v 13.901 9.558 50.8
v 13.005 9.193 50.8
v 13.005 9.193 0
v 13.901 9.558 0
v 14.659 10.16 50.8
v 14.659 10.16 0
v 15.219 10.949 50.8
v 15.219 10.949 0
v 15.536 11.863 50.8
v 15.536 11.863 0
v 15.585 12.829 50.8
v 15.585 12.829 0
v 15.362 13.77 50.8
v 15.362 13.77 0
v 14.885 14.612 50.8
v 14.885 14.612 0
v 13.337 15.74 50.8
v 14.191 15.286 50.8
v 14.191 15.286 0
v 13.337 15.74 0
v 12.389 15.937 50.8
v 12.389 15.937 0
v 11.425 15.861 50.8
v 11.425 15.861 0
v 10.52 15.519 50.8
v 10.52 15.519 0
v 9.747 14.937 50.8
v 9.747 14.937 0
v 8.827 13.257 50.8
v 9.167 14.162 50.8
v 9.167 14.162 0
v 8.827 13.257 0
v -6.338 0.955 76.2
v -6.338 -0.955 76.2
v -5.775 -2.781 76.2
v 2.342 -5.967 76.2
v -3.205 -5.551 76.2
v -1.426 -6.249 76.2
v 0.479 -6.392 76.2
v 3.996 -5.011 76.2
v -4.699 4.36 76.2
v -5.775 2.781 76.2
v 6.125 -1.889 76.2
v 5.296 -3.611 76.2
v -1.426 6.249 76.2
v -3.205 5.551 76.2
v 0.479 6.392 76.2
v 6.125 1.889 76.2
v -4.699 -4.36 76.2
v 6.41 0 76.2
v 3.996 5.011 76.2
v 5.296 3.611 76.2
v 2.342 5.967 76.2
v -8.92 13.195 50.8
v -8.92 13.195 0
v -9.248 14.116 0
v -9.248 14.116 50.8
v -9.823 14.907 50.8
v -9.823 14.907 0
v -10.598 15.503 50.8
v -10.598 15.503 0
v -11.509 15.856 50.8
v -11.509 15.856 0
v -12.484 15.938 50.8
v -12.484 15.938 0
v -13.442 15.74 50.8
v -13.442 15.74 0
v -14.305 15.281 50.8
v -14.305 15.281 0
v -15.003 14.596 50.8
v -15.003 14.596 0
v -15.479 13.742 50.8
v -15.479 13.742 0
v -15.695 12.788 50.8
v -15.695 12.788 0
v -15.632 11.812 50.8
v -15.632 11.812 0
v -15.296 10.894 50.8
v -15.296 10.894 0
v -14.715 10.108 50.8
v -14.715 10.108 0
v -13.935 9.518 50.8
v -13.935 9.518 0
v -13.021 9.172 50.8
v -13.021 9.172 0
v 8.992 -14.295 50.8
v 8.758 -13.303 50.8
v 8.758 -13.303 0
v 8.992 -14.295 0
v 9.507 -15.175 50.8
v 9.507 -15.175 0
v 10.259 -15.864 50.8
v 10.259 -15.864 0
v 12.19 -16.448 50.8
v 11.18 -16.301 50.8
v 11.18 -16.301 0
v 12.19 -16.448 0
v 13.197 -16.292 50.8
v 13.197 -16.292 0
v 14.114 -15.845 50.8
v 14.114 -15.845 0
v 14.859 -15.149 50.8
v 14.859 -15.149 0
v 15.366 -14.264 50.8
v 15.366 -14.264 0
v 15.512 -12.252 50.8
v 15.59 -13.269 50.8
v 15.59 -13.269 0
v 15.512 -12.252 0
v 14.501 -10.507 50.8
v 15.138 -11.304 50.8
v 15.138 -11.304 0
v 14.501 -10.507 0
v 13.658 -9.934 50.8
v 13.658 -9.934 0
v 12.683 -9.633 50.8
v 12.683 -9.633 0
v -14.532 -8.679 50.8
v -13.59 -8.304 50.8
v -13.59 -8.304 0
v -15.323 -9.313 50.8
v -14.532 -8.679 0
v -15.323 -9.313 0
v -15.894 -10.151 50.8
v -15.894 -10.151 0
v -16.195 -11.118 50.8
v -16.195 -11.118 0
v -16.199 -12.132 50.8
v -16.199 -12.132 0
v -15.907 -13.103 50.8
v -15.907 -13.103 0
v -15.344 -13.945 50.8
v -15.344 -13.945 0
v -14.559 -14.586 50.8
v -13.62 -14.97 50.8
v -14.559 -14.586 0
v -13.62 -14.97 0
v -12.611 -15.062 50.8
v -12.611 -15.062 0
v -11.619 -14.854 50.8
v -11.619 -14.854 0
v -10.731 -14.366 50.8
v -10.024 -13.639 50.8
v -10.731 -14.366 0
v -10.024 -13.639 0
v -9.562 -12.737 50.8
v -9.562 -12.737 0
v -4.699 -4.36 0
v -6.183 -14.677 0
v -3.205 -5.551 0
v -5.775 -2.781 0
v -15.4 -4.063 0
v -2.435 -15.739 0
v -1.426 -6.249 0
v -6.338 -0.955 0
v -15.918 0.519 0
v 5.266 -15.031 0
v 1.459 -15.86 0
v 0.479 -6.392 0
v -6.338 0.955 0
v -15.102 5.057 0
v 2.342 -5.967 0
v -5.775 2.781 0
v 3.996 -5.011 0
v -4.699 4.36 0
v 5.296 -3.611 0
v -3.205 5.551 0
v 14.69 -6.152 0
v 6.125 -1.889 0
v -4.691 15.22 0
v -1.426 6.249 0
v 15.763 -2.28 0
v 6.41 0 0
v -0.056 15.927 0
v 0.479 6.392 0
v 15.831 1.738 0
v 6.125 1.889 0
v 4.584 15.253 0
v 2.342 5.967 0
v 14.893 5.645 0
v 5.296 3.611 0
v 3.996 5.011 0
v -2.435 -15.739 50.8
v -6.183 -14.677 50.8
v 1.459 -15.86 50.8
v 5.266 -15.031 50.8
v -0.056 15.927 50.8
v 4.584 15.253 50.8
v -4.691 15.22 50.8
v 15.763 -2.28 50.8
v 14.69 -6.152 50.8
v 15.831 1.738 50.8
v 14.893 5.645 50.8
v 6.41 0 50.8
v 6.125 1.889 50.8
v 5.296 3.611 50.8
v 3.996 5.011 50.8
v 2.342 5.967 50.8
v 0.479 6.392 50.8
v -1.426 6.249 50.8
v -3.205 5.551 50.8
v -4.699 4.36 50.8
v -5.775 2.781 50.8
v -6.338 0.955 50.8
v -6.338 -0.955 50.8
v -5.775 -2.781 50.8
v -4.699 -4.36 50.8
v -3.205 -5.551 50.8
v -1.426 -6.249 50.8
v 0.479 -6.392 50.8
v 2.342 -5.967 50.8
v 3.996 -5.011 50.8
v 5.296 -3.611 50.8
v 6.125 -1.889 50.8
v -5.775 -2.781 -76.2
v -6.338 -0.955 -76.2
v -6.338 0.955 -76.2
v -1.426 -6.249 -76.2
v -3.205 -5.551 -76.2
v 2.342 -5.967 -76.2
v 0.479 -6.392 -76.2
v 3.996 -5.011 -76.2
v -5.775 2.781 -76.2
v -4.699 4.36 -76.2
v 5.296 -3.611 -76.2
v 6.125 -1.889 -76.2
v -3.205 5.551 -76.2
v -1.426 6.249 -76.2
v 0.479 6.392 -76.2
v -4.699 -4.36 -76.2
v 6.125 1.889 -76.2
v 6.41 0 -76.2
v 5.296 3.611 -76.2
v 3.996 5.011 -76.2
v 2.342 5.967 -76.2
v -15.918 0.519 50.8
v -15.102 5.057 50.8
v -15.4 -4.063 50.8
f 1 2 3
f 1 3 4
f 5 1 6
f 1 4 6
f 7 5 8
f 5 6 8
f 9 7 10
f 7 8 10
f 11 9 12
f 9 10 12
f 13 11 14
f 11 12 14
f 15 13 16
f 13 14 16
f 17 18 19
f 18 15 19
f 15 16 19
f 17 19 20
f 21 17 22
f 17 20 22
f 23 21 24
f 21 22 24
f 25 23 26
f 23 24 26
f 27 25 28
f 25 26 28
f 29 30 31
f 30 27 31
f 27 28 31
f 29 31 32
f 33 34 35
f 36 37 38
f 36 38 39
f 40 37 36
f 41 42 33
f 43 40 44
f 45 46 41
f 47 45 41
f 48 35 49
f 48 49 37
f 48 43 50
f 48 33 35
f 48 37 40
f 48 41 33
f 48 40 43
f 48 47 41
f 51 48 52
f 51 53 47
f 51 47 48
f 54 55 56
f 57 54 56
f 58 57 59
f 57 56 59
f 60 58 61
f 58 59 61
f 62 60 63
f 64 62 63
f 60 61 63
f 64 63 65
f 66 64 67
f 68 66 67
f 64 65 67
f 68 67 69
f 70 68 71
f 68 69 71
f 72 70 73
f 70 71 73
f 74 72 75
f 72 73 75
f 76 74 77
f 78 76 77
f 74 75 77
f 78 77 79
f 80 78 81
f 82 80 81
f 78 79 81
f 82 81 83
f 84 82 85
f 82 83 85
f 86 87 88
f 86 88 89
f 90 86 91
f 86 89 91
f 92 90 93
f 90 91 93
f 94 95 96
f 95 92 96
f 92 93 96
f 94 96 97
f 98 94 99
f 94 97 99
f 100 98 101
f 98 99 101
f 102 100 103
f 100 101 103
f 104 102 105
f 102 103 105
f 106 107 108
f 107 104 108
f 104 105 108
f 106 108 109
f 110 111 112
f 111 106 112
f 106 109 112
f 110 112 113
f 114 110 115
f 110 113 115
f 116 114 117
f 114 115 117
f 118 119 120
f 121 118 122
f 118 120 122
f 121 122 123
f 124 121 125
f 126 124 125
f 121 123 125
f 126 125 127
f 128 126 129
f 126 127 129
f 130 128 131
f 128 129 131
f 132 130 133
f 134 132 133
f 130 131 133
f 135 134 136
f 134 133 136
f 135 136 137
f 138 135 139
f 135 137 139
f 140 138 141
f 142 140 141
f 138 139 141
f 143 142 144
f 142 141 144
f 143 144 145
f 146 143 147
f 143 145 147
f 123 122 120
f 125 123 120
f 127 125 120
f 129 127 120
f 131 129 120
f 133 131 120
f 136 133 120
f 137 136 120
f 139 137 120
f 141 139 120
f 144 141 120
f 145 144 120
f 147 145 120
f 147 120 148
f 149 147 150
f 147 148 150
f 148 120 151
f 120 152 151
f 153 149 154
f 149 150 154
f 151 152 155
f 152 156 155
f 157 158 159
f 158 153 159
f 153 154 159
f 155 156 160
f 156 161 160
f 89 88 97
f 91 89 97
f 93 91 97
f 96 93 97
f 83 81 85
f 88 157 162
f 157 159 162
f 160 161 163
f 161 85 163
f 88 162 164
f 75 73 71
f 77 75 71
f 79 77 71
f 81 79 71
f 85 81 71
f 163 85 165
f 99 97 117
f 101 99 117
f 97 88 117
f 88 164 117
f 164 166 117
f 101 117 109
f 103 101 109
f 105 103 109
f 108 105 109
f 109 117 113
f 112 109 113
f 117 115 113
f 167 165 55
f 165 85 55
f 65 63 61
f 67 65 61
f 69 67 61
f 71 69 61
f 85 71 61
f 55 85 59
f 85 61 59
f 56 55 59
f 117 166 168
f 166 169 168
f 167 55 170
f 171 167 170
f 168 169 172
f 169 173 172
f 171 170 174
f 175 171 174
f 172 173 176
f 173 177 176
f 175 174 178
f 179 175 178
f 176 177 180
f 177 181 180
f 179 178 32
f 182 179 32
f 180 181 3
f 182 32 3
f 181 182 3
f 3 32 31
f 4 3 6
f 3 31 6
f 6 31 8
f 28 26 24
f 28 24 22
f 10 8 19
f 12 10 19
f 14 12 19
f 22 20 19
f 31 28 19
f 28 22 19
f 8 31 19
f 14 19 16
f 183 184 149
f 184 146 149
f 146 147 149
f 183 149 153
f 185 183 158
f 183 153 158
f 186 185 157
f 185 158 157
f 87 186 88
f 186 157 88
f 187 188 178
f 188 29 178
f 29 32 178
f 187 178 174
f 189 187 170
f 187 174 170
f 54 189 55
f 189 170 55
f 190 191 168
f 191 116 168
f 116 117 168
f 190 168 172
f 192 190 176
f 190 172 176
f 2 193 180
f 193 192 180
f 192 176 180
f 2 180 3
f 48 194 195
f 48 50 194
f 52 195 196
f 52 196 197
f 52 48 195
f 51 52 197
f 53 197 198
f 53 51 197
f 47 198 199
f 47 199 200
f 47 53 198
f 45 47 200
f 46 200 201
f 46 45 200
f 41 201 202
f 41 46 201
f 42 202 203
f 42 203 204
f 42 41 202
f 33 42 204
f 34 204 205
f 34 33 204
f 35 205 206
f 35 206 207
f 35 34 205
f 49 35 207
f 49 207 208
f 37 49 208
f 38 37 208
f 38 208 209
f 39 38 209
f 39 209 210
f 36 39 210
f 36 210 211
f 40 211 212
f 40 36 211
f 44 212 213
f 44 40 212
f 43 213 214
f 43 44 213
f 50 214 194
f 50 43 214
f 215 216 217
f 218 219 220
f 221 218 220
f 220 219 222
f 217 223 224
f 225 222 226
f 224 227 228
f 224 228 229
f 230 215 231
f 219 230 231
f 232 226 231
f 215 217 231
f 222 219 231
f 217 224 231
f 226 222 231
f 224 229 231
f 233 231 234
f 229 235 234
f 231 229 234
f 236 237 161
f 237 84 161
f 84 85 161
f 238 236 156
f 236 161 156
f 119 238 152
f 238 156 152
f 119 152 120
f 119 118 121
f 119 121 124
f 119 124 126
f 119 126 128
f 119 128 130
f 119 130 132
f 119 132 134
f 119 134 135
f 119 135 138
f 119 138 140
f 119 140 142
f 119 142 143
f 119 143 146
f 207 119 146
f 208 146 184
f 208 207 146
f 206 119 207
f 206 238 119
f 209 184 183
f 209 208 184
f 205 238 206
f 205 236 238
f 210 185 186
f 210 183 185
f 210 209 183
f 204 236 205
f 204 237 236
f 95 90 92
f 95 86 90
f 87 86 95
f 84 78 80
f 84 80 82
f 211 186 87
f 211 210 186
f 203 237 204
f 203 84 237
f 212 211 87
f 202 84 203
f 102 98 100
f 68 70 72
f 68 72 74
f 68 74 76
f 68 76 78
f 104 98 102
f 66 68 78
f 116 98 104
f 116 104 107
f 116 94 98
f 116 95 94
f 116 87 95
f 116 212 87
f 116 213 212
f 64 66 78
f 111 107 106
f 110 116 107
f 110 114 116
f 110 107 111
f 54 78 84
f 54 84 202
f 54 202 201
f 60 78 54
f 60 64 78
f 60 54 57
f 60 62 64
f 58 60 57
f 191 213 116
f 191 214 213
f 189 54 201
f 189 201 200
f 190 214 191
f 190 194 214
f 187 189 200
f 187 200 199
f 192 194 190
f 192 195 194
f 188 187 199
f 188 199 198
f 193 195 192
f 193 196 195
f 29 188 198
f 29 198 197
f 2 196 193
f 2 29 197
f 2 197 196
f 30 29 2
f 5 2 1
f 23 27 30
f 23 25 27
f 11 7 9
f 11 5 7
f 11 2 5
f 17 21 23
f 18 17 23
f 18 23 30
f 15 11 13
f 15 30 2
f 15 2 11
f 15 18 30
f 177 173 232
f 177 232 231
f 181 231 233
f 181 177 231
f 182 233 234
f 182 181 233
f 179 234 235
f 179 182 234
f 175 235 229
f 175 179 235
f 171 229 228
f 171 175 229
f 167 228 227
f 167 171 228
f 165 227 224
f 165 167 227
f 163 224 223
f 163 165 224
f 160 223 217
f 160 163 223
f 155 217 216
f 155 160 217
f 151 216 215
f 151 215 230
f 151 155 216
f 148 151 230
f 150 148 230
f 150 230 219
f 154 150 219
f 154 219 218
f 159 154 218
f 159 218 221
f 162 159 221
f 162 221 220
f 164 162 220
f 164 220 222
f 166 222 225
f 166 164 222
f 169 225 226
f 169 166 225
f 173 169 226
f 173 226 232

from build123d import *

# Parameters (mm, degrees)
F0_R     = 15.9266250138
F0_R_2   = 6.35
F1_DEPTH = 50.8
F2_R     = 3.4266006547
F3_DEPTH = 50.8
F7_R     = 6.4098114124
F8_DEPTH = 76.2


with BuildPart() as f1:
    # F0 (on Top) → F1 (new body)
    with BuildSketch(Plane.XY):
        Circle(F0_R)
        Circle(F0_R_2, mode=Mode.SUBTRACT)
    extrude(amount=F1_DEPTH)



with BuildPart() as f3:
    # F2 (on Top) → F3 (new body)
    with BuildSketch(Plane.XY):
        with Locations((-12.2786890715, 12.5171002001)):
            Circle(F2_R)
    extrude(amount=F3_DEPTH)


with BuildPart() as f4_1:
    # F4: copy of F3
    add(f3.part.moved(Location((24.45152, 0, 0))))


with BuildPart() as f5_1:
    # F5: copy of F4_1
    add(f4_1.part.moved(Location((0, -25.53886, 0))))


with BuildPart() as f6_1:
    # F6: copy of F5_1
    add(f5_1.part.moved(Location((-24.98095, 1.38116, 0))))


with BuildPart() as f1_1:
    add(f1.part)

    add(f3.part)  # F8 merges F3

    add(f4_1.part)  # F8 merges F4_1

    add(f5_1.part)  # F8 merges F5_1

    add(f6_1.part)  # F8 merges F6_1
    # F7 (on Top) → F8 (join, symmetric)
    with BuildSketch(Plane.XY):
        Circle(F7_R)
    extrude(amount=F8_DEPTH, both=True)


solid = f1_1.part
